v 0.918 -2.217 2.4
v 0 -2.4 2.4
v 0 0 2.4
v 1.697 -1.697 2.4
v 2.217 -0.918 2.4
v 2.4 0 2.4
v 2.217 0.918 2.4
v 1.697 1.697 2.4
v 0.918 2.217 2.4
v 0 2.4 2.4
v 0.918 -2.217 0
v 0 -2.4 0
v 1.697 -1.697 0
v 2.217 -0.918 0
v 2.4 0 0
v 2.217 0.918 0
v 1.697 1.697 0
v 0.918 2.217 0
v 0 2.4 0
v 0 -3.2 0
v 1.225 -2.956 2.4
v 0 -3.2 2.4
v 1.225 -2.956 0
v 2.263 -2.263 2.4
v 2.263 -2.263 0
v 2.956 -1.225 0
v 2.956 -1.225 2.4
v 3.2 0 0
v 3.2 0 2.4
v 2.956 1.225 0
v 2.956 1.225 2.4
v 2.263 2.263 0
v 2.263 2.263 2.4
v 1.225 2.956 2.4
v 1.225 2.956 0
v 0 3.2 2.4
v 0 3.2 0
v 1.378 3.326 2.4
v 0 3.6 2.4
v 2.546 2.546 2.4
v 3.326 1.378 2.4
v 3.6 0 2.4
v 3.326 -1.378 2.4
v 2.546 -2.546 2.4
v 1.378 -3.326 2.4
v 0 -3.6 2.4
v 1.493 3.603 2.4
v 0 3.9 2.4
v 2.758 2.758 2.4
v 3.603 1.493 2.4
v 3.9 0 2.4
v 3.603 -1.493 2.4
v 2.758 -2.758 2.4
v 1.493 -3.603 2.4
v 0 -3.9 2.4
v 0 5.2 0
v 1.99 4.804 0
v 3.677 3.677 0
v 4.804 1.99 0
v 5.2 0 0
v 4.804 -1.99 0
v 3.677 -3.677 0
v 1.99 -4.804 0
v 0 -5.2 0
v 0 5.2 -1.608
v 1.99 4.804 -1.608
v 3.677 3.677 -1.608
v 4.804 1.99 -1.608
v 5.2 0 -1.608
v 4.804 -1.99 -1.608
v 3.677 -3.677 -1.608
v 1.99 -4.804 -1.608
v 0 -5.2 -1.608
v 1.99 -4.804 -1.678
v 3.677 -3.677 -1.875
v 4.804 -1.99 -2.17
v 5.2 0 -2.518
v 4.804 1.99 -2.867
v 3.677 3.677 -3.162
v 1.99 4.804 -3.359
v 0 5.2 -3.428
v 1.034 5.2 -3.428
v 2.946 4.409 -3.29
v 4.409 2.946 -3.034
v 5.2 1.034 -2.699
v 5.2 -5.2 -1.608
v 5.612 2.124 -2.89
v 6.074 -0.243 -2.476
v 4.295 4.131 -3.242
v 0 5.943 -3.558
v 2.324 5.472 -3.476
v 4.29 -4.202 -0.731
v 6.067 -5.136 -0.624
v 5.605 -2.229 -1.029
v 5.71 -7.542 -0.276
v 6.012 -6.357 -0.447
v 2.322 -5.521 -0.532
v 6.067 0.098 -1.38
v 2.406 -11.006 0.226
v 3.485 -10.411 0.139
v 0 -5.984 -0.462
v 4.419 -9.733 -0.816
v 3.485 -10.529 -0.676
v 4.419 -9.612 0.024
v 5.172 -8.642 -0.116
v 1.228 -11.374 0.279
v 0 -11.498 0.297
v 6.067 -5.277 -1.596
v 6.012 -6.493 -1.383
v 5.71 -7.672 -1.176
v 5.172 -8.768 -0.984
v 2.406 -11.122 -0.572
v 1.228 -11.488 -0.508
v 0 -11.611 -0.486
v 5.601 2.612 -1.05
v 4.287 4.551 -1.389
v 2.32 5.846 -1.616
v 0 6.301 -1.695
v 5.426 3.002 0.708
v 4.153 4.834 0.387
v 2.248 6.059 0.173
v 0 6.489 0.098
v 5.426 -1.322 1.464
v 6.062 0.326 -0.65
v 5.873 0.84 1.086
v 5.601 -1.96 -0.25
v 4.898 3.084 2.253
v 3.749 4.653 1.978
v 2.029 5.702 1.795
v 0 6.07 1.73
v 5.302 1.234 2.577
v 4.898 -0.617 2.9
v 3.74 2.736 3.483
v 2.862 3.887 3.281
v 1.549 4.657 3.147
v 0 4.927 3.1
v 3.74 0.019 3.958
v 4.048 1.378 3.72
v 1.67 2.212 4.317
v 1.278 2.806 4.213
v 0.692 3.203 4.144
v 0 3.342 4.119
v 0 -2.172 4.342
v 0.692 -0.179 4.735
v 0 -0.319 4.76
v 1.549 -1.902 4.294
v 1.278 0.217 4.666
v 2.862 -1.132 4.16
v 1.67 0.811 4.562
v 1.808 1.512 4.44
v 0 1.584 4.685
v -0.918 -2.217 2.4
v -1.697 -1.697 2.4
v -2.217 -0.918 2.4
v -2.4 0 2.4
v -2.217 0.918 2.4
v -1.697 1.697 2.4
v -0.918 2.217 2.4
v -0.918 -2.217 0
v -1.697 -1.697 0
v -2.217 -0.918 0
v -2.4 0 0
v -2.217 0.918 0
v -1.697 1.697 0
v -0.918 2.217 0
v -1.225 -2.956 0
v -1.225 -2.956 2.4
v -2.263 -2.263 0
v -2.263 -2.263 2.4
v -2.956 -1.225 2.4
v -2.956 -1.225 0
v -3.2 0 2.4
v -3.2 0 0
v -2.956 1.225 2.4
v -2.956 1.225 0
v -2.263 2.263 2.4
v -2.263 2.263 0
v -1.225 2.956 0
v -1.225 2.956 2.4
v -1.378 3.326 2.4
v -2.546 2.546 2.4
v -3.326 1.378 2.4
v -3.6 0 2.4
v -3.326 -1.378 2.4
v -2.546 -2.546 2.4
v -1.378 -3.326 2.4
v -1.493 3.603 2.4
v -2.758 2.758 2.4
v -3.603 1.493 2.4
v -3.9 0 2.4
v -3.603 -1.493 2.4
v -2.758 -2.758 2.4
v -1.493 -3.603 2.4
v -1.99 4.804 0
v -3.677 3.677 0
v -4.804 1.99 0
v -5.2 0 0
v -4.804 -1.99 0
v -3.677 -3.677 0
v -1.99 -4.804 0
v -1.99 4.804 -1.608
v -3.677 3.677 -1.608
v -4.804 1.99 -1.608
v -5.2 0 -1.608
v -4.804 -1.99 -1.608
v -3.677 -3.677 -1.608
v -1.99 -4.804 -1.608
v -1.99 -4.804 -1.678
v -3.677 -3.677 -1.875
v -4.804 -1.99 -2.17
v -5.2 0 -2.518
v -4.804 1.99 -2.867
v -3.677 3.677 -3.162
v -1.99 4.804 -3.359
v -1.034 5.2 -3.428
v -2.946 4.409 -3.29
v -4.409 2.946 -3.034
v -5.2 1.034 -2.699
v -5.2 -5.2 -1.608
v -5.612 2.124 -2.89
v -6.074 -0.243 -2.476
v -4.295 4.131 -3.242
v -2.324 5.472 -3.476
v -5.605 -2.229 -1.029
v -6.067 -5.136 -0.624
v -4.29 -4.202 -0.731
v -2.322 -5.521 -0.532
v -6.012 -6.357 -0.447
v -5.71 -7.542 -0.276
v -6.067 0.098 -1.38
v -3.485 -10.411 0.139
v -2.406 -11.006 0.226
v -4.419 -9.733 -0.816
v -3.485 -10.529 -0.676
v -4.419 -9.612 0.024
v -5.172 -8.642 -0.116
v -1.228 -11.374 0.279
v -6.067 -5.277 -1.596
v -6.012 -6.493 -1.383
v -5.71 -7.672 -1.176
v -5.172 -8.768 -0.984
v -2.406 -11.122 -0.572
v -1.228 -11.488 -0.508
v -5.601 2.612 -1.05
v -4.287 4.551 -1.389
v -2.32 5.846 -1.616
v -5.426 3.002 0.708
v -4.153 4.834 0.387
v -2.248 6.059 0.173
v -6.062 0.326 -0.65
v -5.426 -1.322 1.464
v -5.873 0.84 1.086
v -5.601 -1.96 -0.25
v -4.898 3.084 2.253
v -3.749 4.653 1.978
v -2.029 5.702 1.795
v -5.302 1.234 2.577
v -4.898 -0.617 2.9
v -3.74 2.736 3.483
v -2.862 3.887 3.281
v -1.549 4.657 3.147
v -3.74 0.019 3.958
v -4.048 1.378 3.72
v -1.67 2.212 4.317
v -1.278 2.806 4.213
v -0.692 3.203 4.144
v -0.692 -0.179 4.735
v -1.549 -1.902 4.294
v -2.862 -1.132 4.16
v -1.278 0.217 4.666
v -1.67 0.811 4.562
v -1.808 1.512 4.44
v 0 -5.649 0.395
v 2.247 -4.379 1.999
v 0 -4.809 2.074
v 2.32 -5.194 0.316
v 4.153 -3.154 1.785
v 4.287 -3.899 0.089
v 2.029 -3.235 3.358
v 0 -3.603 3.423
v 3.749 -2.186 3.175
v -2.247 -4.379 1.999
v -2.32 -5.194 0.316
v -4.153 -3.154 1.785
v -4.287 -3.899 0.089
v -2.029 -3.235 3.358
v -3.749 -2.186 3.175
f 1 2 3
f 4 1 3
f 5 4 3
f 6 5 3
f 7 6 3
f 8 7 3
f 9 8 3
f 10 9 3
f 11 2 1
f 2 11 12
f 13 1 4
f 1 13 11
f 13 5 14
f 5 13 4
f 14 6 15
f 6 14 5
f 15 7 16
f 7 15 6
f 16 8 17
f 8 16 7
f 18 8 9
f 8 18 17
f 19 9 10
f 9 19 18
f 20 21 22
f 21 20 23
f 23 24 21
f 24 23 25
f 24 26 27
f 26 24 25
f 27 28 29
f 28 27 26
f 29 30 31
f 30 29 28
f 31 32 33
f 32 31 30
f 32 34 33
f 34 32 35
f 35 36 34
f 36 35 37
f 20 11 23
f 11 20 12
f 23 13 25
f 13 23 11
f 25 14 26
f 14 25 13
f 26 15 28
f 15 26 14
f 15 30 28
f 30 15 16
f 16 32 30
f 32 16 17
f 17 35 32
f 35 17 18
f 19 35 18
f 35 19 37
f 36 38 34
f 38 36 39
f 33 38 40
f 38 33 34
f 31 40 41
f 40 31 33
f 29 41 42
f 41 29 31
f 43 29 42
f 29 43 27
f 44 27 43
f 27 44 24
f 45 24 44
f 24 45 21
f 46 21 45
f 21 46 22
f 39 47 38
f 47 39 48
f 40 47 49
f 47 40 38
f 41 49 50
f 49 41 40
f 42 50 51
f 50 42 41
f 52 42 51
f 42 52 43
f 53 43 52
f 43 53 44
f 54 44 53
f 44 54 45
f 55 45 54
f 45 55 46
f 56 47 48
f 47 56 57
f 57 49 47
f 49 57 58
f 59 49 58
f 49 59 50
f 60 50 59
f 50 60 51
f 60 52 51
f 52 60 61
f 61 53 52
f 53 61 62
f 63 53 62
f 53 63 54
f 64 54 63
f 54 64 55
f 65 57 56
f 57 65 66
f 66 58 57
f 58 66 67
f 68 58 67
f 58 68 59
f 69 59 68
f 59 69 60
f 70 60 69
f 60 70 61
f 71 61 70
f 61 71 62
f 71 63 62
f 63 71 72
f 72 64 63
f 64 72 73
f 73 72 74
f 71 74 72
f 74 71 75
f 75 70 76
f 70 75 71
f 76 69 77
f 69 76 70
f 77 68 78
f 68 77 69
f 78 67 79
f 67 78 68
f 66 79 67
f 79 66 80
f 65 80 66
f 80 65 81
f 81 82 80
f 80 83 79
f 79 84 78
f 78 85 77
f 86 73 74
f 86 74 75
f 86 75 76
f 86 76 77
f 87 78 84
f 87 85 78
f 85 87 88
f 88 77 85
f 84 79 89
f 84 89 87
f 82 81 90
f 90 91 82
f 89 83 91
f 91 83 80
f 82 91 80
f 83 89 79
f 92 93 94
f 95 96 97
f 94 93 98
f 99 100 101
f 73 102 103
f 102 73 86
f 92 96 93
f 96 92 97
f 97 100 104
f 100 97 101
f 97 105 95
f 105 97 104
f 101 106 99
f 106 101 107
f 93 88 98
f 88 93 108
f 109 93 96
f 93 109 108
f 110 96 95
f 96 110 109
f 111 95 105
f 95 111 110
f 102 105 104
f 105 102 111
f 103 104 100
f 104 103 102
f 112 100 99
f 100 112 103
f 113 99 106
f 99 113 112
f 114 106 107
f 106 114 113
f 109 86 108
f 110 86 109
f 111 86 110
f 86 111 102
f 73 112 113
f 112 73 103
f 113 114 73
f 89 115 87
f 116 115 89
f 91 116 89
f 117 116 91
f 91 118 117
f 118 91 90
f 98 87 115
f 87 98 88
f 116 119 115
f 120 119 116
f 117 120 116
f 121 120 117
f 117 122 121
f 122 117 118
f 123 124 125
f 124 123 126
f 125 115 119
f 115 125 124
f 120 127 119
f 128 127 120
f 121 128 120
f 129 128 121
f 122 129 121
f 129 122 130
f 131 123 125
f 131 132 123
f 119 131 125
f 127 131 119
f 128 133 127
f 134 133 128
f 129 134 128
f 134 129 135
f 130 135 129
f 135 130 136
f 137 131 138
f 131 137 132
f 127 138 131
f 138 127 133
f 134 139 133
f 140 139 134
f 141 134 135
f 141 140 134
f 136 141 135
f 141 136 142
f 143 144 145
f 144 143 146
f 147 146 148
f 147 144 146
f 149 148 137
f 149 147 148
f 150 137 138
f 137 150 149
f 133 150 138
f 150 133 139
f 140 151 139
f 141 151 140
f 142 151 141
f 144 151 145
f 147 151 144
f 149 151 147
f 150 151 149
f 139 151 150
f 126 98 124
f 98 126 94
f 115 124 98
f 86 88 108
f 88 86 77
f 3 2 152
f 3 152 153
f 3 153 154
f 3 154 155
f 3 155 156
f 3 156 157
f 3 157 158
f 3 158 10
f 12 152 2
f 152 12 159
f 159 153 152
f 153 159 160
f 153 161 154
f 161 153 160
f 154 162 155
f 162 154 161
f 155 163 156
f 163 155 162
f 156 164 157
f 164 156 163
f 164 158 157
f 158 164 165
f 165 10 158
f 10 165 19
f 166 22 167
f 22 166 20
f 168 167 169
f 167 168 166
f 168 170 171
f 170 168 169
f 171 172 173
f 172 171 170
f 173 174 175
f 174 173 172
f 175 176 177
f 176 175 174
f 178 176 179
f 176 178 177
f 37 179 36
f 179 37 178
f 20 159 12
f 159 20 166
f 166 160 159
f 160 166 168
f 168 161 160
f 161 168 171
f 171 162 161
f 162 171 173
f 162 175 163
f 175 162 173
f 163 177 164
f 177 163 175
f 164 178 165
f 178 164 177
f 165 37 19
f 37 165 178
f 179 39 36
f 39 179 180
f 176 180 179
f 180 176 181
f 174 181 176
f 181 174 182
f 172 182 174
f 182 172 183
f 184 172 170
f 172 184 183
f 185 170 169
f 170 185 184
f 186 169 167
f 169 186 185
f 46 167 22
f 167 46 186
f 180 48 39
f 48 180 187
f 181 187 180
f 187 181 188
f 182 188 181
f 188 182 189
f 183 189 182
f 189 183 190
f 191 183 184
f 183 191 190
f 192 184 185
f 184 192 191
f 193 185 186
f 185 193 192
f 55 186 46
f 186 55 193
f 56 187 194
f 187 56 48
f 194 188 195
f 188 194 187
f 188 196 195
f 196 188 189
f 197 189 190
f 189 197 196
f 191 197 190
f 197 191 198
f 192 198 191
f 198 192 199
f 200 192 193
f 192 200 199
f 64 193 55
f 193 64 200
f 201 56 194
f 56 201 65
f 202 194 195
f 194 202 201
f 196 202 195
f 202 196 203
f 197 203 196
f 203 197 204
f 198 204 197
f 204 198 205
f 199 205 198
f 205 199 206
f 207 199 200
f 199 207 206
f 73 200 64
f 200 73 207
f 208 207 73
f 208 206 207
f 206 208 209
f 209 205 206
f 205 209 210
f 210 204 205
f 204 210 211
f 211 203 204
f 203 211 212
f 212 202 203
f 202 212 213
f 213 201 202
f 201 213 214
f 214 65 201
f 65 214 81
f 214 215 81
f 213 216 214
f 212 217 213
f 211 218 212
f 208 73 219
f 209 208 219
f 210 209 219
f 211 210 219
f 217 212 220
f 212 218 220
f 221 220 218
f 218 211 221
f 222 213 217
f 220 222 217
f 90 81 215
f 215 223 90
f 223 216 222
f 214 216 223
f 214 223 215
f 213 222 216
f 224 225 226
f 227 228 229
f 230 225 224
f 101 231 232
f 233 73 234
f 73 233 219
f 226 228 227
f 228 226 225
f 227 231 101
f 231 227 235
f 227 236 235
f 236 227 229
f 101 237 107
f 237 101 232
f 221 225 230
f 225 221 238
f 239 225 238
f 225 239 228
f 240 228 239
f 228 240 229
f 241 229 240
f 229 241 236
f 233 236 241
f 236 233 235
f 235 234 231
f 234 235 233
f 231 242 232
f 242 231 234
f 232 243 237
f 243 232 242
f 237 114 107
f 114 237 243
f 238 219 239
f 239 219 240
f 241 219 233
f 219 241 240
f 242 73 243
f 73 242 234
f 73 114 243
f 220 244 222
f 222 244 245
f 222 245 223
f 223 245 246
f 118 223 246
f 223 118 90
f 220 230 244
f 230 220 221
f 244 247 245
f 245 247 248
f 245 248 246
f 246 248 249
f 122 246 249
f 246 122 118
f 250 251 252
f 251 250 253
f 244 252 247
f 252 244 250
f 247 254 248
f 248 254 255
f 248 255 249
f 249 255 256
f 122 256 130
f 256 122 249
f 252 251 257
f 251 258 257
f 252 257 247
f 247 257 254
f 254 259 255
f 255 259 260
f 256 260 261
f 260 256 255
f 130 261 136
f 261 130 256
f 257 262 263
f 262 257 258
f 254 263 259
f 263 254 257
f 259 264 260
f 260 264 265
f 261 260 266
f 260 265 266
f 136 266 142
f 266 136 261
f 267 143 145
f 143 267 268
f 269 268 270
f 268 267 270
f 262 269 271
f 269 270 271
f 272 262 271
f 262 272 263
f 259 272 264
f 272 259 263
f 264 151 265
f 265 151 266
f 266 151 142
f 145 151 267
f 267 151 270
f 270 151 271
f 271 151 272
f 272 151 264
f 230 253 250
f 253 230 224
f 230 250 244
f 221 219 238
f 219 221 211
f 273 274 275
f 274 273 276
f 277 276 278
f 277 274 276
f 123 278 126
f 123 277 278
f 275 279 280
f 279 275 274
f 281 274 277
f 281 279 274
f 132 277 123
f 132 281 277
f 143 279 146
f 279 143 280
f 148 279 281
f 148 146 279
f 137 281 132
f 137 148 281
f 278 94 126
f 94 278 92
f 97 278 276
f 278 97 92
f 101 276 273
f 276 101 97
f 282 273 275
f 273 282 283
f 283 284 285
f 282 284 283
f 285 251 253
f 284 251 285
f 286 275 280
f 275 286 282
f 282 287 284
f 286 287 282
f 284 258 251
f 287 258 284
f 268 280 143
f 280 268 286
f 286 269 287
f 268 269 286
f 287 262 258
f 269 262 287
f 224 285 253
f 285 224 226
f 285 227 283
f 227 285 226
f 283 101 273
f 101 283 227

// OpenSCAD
use <../lib.scad>
use <s/4485bs01.scad>
function ldraw_lib__4485b() = [
// 0 Minifig Cap with Long Flat Peak
// 0 Name: 4485b.dat
// 0 Author: Chris Böhnke [KnightOfTarenta]
// 0 !LDRAW_ORG Part UPDATE 2025-01
// 0 !LICENSE Licensed under CC BY 4.0 : see CAreadme.txt
// 
// 0 BFC CERTIFY CCW
  [0,"BFC","CERTIFY"],
  [0,"BFC","CCW"],
// 
// 0 !CATEGORY Minifig Headwear
// 0 !KEYWORDS ambulance, baseball, coast guard, hat, Octan, police
// 
// 0 !HISTORY 2013-08-14 {LEGO Digital Designer} Original part shape
// 0 !HISTORY 2024-09-07 [KnightOfTarenta] File preparation for LDraw Parts Tracker
// 0 !HISTORY 2025-01-20 [OrionP] Official Update 2025-01
// 
// 1 16 0 0 0 1 0 0 0 1 0 0 0 1 s\4485bs01.dat
  [1,16,0,0,0,1,0,0,0,1,0,0,0,1, ldraw_lib__s__4485bs01()],
// 1 16 0 0 0 -1 0 0 0 1 0 0 0 1 s\4485bs01.dat
  [1,16,0,0,0,-1,0,0,0,1,0,0,0,1, ldraw_lib__s__4485bs01()],
// 
// 0 // Patternable Area
// 4 16 5.8 -.789 -12.985 5.618 -4.997 -10.947 0 -5.185 -12.022 0 -.988 -14.122
  [4,16,5.8,-.789,-12.985,5.618,-4.997,-10.947,0,-5.185,-12.022,0,-.988,-14.122],
// 3 16 10.382 -4.462 -7.885 5.8 -.789 -12.985 10.717 -.223 -9.747
  [3,16,10.382,-4.462,-7.885,5.8,-.789,-12.985,10.717,-.223,-9.747],
// 3 16 10.382 -4.462 -7.885 5.618 -4.997 -10.947 5.8 -.789 -12.985
  [3,16,10.382,-4.462,-7.885,5.618,-4.997,-10.947,5.8,-.789,-12.985],
// 3 16 13.564 -3.66 -3.304 10.717 -.223 -9.747 14.002 .625 -4.901
  [3,16,13.564,-3.66,-3.304,10.717,-.223,-9.747,14.002,.625,-4.901],
// 3 16 13.564 -3.66 -3.304 10.382 -4.462 -7.885 10.717 -.223 -9.747
  [3,16,13.564,-3.66,-3.304,10.382,-4.462,-7.885,10.717,-.223,-9.747],
// 4 16 5.072 -8.396 -8.087 0 -8.557 -9.007 0 -5.185 -12.022 5.618 -4.997 -10.947
  [4,16,5.072,-8.396,-8.087,0,-8.557,-9.007,0,-5.185,-12.022,5.618,-4.997,-10.947],
// 3 16 9.373 -7.937 -5.466 5.618 -4.997 -10.947 10.382 -4.462 -7.885
  [3,16,9.373,-7.937,-5.466,5.618,-4.997,-10.947,10.382,-4.462,-7.885],
// 3 16 9.373 -7.937 -5.466 5.072 -8.396 -8.087 5.618 -4.997 -10.947
  [3,16,9.373,-7.937,-5.466,5.072,-8.396,-8.087,5.618,-4.997,-10.947],
// 3 16 12.246 -7.251 -1.543 10.382 -4.462 -7.885 13.564 -3.66 -3.304
  [3,16,12.246,-7.251,-1.543,10.382,-4.462,-7.885,13.564,-3.66,-3.304],
// 3 16 12.246 -7.251 -1.543 9.373 -7.937 -5.466 10.382 -4.462 -7.885
  [3,16,12.246,-7.251,-1.543,9.373,-7.937,-5.466,10.382,-4.462,-7.885],
// 4 16 5.072 -8.396 -8.087 3.873 -10.735 -4.755 0 -10.854 -5.43 0 -8.557 -9.007
  [4,16,5.072,-8.396,-8.087,3.873,-10.735,-4.755,0,-10.854,-5.43,0,-8.557,-9.007],
// 3 16 7.156 -10.399 -2.831 5.072 -8.396 -8.087 9.373 -7.937 -5.466
  [3,16,7.156,-10.399,-2.831,5.072,-8.396,-8.087,9.373,-7.937,-5.466],
// 3 16 7.156 -10.399 -2.831 3.873 -10.735 -4.755 5.072 -8.396 -8.087
  [3,16,7.156,-10.399,-2.831,3.873,-10.735,-4.755,5.072,-8.396,-8.087],
// 3 16 9.35 -9.895 .048 9.373 -7.937 -5.466 12.246 -7.251 -1.543
  [3,16,9.35,-9.895,.048,9.373,-7.937,-5.466,12.246,-7.251,-1.543],
// 3 16 9.35 -9.895 .048 7.156 -10.399 -2.831 9.373 -7.937 -5.466
  [3,16,9.35,-9.895,.048,7.156,-10.399,-2.831,9.373,-7.937,-5.466],
// 4 16 14.013 2.572 -5.573 14.002 .625 -4.901 10.717 -.223 -9.747 10.725 1.827 -10.506
  [4,16,14.013,2.572,-5.573,14.002,.625,-4.901,10.717,-.223,-9.747,10.725,1.827,-10.506],
// 4 16 10.725 1.827 -10.506 10.717 -.223 -9.747 5.8 -.789 -12.985 5.804 1.329 -13.802
  [4,16,10.725,1.827,-10.506,10.717,-.223,-9.747,5.8,-.789,-12.985,5.804,1.329,-13.802],
// 4 16 5.8 -.789 -12.985 0 -.988 -14.122 0 1.154 -14.959 5.804 1.329 -13.802
  [4,16,5.8,-.789,-12.985,0,-.988,-14.122,0,1.154,-14.959,5.804,1.329,-13.802],
// 4 16 0 -5.185 -12.022 -5.618 -4.997 -10.947 -5.8 -.789 -12.985 0 -.988 -14.122
  [4,16,0,-5.185,-12.022,-5.618,-4.997,-10.947,-5.8,-.789,-12.985,0,-.988,-14.122],
// 3 16 -5.8 -.789 -12.985 -10.382 -4.462 -7.885 -10.717 -.223 -9.747
  [3,16,-5.8,-.789,-12.985,-10.382,-4.462,-7.885,-10.717,-.223,-9.747],
// 3 16 -5.618 -4.997 -10.947 -10.382 -4.462 -7.885 -5.8 -.789 -12.985
  [3,16,-5.618,-4.997,-10.947,-10.382,-4.462,-7.885,-5.8,-.789,-12.985],
// 3 16 -10.717 -.223 -9.747 -13.564 -3.66 -3.304 -14.002 .625 -4.901
  [3,16,-10.717,-.223,-9.747,-13.564,-3.66,-3.304,-14.002,.625,-4.901],
// 3 16 -10.382 -4.462 -7.885 -13.564 -3.66 -3.304 -10.717 -.223 -9.747
  [3,16,-10.382,-4.462,-7.885,-13.564,-3.66,-3.304,-10.717,-.223,-9.747],
// 4 16 -5.072 -8.396 -8.087 -5.618 -4.997 -10.947 0 -5.185 -12.022 0 -8.557 -9.007
  [4,16,-5.072,-8.396,-8.087,-5.618,-4.997,-10.947,0,-5.185,-12.022,0,-8.557,-9.007],
// 3 16 -5.618 -4.997 -10.947 -9.373 -7.937 -5.466 -10.382 -4.462 -7.885
  [3,16,-5.618,-4.997,-10.947,-9.373,-7.937,-5.466,-10.382,-4.462,-7.885],
// 3 16 -5.072 -8.396 -8.087 -9.373 -7.937 -5.466 -5.618 -4.997 -10.947
  [3,16,-5.072,-8.396,-8.087,-9.373,-7.937,-5.466,-5.618,-4.997,-10.947],
// 3 16 -10.382 -4.462 -7.885 -12.246 -7.251 -1.543 -13.564 -3.66 -3.304
  [3,16,-10.382,-4.462,-7.885,-12.246,-7.251,-1.543,-13.564,-3.66,-3.304],
// 3 16 -9.373 -7.937 -5.466 -12.246 -7.251 -1.543 -10.382 -4.462 -7.885
  [3,16,-9.373,-7.937,-5.466,-12.246,-7.251,-1.543,-10.382,-4.462,-7.885],
// 4 16 0 -10.854 -5.43 -3.873 -10.735 -4.755 -5.072 -8.396 -8.087 0 -8.557 -9.007
  [4,16,0,-10.854,-5.43,-3.873,-10.735,-4.755,-5.072,-8.396,-8.087,0,-8.557,-9.007],
// 3 16 -5.072 -8.396 -8.087 -7.156 -10.399 -2.831 -9.373 -7.937 -5.466
  [3,16,-5.072,-8.396,-8.087,-7.156,-10.399,-2.831,-9.373,-7.937,-5.466],
// 3 16 -3.873 -10.735 -4.755 -7.156 -10.399 -2.831 -5.072 -8.396 -8.087
  [3,16,-3.873,-10.735,-4.755,-7.156,-10.399,-2.831,-5.072,-8.396,-8.087],
// 3 16 -9.373 -7.937 -5.466 -9.35 -9.895 .048 -12.246 -7.251 -1.543
  [3,16,-9.373,-7.937,-5.466,-9.35,-9.895,.048,-12.246,-7.251,-1.543],
// 3 16 -7.156 -10.399 -2.831 -9.35 -9.895 .048 -9.373 -7.937 -5.466
  [3,16,-7.156,-10.399,-2.831,-9.35,-9.895,.048,-9.373,-7.937,-5.466],
// 4 16 -10.717 -.223 -9.747 -14.002 .625 -4.901 -14.013 2.572 -5.573 -10.725 1.827 -10.506
  [4,16,-10.717,-.223,-9.747,-14.002,.625,-4.901,-14.013,2.572,-5.573,-10.725,1.827,-10.506],
// 4 16 -5.8 -.789 -12.985 -10.717 -.223 -9.747 -10.725 1.827 -10.506 -5.804 1.329 -13.802
  [4,16,-5.8,-.789,-12.985,-10.717,-.223,-9.747,-10.725,1.827,-10.506,-5.804,1.329,-13.802],
// 4 16 -5.8 -.789 -12.985 -5.804 1.329 -13.802 0 1.154 -14.959 0 -.988 -14.122
  [4,16,-5.8,-.789,-12.985,-5.804,1.329,-13.802,0,1.154,-14.959,0,-.988,-14.122],
];
module ldraw_lib__4485b(step=0, col=false, unit=2/5, alt=false, line=0.2, solid=!$preview)
    makepoly(ldraw_lib__4485b(), step=step, col=col, unit=unit, alt=alt, line=line, solid=solid);
ldraw_lib__4485b(line=0.2);
